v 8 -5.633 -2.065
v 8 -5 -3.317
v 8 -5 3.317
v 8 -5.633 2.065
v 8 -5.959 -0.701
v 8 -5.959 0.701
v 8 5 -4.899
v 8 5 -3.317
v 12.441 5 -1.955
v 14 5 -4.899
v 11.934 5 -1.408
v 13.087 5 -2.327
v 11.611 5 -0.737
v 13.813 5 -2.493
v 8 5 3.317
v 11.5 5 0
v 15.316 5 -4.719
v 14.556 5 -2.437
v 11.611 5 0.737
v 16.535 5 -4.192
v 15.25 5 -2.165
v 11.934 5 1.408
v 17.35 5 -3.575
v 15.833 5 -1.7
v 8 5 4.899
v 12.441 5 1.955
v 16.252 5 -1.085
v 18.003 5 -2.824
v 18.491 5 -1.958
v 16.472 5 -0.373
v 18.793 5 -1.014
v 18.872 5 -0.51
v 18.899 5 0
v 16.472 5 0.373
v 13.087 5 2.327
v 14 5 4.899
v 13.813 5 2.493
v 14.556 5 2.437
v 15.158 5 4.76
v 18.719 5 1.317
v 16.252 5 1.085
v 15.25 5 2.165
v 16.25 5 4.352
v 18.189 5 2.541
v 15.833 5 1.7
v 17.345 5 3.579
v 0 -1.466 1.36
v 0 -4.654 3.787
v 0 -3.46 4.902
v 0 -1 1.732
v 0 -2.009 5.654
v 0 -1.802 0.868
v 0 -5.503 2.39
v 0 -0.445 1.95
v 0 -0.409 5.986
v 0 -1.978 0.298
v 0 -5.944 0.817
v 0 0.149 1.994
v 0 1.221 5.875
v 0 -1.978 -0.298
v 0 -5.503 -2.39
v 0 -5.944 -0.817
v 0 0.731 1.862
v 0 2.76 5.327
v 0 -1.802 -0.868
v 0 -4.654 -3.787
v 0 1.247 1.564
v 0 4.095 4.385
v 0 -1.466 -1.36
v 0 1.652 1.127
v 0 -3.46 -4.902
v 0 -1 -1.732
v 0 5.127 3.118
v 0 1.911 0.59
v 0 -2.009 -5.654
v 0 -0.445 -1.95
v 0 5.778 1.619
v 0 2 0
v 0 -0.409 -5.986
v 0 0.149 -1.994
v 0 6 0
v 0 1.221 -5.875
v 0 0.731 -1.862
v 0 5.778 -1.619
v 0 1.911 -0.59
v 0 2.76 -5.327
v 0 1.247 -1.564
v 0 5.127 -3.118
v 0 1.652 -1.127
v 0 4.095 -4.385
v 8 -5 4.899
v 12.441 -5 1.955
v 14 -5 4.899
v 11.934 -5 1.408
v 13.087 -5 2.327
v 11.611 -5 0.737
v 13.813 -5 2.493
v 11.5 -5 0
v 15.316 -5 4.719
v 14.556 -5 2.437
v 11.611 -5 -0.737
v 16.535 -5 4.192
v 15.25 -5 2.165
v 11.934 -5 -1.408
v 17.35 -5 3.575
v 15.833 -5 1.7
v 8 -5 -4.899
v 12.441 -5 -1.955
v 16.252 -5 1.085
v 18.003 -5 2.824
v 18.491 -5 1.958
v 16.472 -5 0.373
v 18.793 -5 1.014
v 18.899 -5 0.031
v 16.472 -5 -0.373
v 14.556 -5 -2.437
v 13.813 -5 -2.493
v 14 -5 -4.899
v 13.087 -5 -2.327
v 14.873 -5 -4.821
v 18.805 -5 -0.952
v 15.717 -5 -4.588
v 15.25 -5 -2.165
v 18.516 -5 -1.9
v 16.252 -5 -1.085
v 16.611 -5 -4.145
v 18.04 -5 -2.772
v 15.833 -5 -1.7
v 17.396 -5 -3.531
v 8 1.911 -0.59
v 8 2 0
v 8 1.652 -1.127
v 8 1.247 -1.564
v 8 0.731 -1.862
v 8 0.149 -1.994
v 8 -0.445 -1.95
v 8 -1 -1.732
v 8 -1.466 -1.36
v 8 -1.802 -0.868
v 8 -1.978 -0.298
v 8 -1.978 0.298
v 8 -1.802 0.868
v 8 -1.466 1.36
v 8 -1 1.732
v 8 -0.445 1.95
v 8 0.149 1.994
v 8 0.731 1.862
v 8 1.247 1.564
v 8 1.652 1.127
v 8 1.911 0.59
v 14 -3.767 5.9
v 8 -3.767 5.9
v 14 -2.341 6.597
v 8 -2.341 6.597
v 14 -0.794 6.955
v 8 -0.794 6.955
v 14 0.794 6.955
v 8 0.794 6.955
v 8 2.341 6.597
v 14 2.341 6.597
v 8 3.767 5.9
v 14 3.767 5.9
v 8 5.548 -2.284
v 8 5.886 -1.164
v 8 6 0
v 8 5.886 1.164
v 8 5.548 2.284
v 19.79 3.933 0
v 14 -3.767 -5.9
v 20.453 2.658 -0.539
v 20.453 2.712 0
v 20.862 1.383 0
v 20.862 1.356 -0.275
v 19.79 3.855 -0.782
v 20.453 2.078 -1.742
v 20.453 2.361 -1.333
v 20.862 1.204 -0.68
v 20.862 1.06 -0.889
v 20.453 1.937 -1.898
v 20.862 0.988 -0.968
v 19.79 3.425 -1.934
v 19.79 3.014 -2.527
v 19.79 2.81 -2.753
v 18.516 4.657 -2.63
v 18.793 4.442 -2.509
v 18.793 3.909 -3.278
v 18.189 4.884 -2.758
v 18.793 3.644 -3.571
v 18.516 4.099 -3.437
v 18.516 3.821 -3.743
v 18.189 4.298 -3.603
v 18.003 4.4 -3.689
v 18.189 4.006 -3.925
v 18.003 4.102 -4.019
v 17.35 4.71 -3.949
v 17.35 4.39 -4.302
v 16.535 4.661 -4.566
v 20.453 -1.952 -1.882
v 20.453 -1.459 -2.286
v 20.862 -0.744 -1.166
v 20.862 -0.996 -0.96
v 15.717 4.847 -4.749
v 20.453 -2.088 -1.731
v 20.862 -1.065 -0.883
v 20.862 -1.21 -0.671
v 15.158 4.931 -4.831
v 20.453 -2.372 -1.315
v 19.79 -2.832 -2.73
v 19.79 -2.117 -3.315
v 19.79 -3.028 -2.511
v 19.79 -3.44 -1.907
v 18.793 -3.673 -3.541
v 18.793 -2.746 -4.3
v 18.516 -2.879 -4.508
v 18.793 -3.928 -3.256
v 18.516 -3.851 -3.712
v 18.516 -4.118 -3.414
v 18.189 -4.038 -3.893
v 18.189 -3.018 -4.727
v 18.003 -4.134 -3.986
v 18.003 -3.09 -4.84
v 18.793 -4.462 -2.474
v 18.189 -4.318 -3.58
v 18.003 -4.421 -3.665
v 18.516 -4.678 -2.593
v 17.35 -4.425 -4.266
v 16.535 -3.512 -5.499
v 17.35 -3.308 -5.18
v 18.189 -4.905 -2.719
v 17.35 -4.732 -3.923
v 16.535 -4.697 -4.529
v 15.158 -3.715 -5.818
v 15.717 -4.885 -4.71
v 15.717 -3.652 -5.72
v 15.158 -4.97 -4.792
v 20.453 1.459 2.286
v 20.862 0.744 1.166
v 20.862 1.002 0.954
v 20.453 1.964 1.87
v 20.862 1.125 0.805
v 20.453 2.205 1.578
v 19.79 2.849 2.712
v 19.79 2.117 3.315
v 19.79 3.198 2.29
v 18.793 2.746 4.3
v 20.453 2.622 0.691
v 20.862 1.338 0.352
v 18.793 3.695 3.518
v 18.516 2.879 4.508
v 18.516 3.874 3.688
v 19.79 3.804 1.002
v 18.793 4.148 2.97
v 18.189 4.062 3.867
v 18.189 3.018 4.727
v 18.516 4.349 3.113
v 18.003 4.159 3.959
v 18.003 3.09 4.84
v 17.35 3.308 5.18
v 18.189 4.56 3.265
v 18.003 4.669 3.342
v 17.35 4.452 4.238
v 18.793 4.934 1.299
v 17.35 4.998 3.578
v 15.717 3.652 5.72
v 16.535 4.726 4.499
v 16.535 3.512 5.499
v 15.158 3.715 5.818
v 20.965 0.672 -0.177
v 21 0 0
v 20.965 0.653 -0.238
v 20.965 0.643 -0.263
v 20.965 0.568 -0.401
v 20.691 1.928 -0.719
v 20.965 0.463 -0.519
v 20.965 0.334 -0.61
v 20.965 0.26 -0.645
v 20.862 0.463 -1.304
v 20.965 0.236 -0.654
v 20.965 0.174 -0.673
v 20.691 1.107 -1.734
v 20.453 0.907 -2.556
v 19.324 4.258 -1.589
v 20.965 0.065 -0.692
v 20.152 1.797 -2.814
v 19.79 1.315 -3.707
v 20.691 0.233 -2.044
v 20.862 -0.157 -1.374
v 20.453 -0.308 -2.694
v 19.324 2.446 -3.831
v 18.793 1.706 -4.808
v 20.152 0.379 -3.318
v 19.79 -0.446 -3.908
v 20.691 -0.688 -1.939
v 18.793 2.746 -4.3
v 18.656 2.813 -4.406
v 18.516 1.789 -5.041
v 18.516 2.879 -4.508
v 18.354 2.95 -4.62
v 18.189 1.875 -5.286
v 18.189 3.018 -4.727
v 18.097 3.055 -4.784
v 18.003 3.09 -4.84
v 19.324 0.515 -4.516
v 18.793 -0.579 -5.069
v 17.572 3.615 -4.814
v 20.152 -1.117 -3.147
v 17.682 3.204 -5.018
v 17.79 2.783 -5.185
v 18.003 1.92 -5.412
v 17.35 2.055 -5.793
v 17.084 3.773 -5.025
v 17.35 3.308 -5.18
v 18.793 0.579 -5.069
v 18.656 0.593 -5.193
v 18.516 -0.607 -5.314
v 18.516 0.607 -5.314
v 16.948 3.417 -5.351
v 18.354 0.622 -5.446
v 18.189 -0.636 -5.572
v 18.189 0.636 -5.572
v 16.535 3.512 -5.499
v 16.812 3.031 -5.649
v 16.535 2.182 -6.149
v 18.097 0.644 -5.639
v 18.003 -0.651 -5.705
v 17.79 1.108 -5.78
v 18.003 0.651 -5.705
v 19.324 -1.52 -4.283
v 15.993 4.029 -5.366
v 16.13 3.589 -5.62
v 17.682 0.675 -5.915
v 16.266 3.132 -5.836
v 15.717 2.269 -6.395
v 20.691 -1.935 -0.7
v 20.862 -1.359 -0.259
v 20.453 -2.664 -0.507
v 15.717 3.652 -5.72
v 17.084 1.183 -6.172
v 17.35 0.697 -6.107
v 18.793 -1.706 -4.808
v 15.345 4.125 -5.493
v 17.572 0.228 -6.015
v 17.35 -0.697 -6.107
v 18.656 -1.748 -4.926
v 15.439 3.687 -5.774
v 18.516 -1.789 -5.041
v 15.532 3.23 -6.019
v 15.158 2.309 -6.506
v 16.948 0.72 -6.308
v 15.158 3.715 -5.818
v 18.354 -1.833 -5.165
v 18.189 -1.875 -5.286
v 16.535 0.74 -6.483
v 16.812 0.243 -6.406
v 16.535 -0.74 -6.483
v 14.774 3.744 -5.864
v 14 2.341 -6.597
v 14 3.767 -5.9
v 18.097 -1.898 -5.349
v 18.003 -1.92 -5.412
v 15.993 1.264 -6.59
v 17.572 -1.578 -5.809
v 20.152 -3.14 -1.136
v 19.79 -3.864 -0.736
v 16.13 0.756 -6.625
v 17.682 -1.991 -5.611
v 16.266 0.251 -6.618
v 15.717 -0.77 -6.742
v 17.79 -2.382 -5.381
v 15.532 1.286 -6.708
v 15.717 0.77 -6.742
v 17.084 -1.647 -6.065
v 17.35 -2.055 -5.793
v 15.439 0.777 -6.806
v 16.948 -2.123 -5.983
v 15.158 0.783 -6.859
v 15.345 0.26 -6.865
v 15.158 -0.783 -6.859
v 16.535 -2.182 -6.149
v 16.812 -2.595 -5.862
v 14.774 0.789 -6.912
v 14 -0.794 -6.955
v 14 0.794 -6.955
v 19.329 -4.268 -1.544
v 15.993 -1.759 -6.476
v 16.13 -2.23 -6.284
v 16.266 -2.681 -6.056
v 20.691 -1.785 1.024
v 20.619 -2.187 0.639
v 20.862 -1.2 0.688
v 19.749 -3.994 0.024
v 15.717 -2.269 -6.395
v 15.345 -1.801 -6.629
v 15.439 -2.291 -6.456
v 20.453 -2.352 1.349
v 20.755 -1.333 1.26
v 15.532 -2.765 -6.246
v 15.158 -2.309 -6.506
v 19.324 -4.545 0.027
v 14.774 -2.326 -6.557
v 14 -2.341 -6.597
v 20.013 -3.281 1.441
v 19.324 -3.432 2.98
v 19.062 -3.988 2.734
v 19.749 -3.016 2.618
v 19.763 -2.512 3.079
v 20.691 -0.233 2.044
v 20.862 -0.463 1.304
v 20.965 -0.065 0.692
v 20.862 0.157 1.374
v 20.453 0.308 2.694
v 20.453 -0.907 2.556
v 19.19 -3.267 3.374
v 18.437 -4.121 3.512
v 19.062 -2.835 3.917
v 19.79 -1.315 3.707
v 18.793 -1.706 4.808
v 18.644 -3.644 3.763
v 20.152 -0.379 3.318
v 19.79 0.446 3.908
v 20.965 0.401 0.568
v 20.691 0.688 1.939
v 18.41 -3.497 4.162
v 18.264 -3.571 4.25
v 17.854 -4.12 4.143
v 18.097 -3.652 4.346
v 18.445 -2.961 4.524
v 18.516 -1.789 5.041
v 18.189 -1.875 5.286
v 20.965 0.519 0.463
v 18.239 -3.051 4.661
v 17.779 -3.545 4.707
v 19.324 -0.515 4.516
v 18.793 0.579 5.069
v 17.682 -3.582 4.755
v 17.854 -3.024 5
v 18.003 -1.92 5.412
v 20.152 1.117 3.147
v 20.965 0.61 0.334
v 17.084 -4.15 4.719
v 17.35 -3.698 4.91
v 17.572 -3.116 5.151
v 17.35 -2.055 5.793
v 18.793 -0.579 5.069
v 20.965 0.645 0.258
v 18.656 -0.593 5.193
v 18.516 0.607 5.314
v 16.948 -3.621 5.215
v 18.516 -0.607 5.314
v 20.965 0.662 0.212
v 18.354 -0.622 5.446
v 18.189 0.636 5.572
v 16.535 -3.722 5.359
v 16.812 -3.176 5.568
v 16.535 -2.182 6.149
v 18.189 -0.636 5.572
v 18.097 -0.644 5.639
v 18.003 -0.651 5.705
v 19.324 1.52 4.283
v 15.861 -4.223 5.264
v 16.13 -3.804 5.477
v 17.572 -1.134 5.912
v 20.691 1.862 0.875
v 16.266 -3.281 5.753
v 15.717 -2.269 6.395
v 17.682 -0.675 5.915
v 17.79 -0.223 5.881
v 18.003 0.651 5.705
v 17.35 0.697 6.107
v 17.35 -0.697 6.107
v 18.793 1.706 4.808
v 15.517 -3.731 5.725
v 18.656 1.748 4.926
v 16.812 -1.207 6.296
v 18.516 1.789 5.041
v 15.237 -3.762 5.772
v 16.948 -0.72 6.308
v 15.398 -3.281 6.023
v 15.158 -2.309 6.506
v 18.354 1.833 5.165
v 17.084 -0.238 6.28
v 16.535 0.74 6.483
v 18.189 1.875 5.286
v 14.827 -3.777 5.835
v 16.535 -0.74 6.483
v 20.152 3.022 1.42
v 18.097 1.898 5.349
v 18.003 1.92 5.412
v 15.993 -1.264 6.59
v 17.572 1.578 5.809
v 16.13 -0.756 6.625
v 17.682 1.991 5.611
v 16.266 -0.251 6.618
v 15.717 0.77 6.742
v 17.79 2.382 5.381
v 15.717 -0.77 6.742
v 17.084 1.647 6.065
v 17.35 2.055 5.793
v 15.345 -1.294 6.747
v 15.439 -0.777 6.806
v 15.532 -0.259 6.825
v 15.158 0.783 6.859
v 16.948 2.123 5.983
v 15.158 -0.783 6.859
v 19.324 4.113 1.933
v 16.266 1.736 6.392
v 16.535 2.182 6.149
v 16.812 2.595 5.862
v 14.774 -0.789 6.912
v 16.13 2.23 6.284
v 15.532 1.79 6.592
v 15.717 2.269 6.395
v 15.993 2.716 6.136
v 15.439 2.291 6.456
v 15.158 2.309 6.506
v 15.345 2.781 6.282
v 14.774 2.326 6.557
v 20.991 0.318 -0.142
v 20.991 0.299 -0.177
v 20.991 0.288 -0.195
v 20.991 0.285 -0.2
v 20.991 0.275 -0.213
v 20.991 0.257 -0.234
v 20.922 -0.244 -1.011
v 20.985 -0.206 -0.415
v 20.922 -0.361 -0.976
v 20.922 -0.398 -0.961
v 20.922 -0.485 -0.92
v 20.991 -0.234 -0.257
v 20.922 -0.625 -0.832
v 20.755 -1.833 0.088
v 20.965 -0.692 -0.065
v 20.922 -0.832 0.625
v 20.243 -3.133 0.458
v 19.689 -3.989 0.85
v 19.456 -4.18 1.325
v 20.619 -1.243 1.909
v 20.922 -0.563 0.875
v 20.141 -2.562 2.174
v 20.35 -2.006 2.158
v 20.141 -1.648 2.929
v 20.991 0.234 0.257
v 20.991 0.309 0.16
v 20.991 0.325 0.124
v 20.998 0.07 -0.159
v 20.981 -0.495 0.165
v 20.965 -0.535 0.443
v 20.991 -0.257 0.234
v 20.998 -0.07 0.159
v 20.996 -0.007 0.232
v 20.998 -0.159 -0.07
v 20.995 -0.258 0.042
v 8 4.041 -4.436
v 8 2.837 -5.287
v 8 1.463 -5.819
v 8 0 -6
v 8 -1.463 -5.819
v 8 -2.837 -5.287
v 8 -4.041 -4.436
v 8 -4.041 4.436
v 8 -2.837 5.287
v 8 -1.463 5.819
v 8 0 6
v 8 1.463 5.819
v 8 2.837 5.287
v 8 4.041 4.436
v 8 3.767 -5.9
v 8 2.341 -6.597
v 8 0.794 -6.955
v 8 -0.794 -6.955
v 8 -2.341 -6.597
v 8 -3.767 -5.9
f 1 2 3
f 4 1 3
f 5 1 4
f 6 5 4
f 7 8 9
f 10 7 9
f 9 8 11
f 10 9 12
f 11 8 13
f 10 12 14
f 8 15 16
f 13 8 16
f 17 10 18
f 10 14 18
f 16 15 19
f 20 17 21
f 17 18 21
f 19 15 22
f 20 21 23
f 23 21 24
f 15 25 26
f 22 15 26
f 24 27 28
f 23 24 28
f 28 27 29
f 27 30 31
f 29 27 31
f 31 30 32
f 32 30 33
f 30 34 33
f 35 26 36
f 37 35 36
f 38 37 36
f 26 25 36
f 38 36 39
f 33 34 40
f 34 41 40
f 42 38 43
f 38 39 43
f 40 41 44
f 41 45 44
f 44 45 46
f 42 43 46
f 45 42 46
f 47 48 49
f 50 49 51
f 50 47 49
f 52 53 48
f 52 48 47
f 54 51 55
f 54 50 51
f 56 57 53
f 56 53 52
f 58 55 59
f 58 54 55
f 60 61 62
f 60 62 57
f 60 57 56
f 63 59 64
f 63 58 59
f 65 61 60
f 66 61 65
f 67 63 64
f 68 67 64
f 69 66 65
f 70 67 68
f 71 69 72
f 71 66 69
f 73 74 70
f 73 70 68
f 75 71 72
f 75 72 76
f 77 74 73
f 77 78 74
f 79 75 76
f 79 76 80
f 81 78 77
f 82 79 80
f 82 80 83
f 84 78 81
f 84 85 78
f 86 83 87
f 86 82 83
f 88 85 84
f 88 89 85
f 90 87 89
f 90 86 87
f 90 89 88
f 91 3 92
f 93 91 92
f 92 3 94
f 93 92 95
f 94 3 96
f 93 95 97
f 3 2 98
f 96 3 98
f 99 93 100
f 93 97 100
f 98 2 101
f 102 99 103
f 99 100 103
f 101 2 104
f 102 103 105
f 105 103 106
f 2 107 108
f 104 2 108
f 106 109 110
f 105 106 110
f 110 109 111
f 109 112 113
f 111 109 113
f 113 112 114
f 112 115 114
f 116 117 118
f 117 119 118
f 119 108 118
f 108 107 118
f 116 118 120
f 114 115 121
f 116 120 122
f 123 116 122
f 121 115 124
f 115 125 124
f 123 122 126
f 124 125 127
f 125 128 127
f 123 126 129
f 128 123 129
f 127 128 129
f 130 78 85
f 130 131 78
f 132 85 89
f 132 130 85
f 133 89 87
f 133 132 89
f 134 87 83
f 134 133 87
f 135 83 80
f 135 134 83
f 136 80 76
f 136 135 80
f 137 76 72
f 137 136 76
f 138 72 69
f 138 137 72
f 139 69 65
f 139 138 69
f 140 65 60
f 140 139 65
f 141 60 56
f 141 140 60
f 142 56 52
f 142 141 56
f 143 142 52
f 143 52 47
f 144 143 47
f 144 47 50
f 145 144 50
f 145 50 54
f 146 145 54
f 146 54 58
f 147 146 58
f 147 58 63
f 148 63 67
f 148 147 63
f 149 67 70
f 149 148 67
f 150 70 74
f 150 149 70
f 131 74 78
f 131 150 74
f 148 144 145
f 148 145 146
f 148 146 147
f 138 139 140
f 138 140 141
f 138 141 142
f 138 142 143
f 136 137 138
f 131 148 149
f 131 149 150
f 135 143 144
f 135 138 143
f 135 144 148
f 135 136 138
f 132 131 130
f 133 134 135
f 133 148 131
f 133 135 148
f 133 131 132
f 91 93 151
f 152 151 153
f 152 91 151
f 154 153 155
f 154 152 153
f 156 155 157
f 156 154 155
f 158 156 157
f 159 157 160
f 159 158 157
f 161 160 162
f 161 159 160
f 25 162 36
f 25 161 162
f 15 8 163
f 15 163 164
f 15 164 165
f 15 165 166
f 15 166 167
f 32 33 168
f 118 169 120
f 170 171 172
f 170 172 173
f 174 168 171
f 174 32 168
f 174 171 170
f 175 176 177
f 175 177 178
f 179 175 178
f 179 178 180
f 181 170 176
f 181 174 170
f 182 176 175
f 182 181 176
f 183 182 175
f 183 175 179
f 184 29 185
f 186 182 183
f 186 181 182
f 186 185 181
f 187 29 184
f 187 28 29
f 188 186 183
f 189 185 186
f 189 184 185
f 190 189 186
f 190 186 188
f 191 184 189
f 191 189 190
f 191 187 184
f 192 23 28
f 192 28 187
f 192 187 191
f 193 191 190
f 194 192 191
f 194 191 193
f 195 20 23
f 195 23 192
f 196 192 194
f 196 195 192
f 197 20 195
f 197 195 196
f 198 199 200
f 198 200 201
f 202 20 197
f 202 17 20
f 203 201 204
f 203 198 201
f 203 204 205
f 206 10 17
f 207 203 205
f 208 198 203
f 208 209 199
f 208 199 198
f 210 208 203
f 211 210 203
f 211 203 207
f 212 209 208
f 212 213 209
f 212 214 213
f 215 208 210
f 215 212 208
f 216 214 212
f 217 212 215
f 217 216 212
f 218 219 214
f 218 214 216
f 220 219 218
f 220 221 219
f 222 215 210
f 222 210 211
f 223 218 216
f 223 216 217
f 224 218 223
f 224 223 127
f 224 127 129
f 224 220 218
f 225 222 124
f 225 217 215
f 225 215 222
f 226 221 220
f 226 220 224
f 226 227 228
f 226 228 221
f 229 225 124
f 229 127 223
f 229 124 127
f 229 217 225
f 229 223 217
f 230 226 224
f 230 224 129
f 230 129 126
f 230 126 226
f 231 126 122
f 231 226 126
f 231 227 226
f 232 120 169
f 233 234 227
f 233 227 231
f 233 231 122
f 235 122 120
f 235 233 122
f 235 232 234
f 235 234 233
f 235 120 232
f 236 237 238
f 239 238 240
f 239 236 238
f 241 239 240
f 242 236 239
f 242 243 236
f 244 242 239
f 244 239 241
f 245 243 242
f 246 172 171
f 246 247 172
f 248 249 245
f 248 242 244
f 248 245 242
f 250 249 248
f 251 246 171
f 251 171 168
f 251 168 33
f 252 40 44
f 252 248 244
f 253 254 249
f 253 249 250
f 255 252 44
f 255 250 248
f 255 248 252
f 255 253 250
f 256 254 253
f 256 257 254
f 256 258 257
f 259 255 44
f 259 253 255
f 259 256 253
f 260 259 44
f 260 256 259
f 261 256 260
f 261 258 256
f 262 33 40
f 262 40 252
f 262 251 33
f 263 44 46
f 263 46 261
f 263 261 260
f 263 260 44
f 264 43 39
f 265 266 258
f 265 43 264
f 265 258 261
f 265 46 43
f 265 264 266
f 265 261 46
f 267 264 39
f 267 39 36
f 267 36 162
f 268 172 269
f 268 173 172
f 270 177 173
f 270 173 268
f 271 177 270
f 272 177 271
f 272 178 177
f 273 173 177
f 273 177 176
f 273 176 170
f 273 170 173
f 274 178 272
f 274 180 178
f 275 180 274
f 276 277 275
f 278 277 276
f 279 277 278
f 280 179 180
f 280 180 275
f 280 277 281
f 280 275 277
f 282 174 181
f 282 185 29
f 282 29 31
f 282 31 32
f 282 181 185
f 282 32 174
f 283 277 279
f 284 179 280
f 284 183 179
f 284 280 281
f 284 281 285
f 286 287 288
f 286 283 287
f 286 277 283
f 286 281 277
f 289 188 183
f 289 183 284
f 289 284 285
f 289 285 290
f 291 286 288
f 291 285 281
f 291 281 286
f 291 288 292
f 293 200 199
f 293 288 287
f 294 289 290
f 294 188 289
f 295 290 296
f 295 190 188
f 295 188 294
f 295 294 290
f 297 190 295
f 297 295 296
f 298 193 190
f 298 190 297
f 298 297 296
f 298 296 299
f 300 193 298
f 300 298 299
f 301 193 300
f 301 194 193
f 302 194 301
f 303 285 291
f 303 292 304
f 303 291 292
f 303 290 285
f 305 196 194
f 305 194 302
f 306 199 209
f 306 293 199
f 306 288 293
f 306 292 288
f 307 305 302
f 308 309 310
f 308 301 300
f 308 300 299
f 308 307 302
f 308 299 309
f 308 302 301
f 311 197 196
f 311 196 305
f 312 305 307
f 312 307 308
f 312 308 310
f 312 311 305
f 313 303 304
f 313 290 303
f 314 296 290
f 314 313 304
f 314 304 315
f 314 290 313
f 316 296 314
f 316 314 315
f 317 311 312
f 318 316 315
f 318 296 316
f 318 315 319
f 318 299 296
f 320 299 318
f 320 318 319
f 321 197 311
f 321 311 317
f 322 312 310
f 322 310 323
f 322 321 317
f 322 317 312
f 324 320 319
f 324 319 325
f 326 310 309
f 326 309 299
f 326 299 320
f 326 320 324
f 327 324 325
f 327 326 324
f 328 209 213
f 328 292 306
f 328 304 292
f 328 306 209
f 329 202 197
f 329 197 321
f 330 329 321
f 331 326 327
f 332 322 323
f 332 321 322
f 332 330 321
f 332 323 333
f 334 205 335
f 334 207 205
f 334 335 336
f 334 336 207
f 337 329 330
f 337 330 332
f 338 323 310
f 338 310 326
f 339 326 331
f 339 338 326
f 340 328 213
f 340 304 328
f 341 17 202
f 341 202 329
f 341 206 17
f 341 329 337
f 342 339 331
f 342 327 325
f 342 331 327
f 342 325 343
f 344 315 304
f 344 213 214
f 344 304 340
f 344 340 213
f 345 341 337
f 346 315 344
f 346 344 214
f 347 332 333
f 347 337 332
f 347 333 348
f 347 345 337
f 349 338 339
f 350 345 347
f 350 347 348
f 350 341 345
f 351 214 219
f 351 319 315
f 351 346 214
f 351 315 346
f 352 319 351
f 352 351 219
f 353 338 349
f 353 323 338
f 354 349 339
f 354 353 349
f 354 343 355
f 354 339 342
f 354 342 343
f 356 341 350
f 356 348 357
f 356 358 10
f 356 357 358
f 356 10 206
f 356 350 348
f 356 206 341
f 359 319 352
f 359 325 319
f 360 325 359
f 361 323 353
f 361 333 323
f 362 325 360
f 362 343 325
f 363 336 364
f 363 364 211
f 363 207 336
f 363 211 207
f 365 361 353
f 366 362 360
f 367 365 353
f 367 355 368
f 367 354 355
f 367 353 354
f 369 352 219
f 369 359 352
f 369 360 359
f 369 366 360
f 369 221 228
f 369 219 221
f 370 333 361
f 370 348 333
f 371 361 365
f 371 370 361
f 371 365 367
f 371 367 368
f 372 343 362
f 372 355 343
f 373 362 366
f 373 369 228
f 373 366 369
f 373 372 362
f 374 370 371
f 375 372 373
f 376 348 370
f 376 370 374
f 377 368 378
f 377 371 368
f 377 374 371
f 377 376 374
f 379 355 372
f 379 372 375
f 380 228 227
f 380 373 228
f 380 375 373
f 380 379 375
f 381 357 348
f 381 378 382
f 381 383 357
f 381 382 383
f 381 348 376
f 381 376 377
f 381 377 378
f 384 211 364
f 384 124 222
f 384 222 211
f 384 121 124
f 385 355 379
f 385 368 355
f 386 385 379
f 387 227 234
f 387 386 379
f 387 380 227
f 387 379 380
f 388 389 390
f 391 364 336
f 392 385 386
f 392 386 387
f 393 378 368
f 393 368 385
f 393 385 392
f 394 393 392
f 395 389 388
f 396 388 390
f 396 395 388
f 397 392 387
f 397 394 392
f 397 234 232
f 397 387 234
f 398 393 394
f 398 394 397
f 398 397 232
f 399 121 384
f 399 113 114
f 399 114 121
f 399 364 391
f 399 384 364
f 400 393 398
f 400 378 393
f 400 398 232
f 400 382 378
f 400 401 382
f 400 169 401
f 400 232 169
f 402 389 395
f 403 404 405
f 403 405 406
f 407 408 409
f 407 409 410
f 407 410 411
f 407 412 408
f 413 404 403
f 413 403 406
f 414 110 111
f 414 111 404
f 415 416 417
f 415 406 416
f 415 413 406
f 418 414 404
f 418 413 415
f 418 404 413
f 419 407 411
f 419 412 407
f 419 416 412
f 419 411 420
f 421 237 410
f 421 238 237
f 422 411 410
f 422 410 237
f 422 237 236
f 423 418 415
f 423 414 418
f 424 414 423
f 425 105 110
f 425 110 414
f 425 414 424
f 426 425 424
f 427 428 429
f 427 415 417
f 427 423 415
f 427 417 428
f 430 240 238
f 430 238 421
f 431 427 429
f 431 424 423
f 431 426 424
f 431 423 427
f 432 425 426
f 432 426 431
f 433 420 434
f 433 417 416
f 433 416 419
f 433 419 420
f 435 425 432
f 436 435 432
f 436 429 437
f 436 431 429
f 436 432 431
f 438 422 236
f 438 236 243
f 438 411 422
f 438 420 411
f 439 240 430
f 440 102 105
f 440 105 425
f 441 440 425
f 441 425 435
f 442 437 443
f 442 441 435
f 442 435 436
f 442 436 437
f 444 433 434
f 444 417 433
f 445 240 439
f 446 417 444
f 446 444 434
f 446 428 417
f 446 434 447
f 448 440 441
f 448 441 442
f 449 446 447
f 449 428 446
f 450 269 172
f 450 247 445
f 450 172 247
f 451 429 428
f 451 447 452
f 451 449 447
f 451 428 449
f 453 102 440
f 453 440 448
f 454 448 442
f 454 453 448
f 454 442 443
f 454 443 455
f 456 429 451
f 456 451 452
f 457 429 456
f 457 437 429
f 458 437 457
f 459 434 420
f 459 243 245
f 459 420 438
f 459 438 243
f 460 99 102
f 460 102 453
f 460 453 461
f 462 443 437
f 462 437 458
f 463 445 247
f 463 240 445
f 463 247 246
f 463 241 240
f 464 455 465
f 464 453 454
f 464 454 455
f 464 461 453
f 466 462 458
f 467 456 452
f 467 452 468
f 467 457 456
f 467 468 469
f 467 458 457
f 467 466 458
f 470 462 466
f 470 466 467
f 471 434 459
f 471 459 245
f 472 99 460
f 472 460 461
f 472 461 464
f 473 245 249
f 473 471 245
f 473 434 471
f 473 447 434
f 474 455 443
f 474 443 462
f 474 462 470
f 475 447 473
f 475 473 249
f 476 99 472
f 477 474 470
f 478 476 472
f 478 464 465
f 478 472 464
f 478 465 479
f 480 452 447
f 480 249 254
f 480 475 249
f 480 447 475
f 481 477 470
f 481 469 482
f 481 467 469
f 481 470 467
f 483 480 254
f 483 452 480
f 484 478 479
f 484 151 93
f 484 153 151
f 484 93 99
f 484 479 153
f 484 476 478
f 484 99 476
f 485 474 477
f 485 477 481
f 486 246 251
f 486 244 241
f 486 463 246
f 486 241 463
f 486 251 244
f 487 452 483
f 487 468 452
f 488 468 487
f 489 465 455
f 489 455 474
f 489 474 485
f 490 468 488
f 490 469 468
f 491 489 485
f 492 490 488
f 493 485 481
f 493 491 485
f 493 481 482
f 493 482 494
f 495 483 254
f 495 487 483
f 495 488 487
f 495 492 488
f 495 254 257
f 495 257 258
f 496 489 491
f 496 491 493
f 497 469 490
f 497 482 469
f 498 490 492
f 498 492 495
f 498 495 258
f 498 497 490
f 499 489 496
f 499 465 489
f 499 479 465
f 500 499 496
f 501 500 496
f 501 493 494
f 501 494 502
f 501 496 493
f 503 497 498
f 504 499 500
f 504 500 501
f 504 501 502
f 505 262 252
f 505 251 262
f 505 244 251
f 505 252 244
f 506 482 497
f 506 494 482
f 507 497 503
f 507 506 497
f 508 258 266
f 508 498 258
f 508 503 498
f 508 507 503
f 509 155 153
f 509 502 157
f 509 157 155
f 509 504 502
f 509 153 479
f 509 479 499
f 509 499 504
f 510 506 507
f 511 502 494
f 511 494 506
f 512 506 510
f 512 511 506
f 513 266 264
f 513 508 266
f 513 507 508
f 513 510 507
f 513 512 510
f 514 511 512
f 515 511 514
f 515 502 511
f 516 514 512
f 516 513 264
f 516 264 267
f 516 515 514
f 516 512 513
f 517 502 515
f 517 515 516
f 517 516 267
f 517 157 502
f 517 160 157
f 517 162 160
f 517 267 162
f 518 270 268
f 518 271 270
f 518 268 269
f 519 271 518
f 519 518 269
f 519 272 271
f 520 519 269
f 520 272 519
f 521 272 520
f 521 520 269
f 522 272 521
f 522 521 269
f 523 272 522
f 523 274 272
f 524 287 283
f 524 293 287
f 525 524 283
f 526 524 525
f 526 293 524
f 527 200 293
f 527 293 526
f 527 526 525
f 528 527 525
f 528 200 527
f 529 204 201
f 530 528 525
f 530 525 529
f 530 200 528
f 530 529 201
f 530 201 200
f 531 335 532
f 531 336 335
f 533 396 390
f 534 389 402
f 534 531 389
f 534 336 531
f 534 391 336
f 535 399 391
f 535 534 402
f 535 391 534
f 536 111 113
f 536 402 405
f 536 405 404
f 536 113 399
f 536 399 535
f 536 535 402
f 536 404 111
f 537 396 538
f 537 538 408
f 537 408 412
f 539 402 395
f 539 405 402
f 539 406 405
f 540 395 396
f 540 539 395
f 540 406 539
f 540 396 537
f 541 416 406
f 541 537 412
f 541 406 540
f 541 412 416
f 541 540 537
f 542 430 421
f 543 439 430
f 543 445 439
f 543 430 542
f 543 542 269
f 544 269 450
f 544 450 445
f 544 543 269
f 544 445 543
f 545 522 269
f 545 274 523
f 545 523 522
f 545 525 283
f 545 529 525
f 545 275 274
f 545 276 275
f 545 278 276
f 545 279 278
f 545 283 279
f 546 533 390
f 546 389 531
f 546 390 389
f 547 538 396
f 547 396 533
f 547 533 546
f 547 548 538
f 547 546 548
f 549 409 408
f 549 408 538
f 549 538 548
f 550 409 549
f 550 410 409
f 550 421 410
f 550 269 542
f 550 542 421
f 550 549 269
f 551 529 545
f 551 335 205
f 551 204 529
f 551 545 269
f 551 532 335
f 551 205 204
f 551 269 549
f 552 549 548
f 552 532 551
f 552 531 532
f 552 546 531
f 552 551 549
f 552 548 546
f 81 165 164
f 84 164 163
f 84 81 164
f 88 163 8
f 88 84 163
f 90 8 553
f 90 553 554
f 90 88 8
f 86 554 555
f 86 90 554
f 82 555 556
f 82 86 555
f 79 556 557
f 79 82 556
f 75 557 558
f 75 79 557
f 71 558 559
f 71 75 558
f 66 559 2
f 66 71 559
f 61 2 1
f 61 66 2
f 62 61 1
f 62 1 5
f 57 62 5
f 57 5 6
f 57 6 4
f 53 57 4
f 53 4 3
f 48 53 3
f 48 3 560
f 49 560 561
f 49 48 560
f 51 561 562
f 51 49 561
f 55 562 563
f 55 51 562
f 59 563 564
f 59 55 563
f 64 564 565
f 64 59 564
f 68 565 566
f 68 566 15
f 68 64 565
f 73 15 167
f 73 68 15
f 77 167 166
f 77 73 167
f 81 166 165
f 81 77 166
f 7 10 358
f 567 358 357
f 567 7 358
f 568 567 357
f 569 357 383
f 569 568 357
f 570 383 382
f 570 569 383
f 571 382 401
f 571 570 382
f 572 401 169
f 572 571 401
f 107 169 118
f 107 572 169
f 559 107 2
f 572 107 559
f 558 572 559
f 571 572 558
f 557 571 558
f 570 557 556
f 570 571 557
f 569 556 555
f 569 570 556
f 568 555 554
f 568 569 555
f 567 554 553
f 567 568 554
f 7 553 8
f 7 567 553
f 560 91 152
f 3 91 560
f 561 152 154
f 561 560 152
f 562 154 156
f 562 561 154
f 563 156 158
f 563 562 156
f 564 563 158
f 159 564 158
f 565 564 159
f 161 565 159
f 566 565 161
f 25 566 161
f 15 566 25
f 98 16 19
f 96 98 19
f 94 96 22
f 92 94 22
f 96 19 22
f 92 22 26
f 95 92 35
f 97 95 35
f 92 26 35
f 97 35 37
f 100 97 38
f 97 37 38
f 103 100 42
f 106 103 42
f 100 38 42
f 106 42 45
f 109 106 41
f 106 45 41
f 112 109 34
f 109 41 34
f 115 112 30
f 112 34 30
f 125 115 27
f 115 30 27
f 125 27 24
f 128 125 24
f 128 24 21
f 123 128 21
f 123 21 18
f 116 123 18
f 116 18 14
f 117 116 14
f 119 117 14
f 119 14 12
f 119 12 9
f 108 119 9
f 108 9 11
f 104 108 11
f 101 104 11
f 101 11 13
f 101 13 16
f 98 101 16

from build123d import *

# Parameters (mm, degrees)
F2_W     = 20
F2_H     = 8.8103966404
F3_DEPTH = 12.5
F4_R     = 2.5
F5_DEPTH = 25


# Not quite as in the source:
# - ends of sketch curves that miss each other by under 0.0002 mm in the source are joined


with BuildPart() as f1:
    # F0 (on Top) → F1 (revolve)
    with BuildSketch(Plane.XY):
        with BuildLine():
            Line((0, 6), (0, 2))
            Line((0, 2), (8, 2))
            Line((8, 2), (8, 0))
            Line((8, 0), (21, 0))
            ThreePointArc((21, 0), (18.9497474683, 4.9497475801), (14, 7.0000001118))
            Line((14, 7.0000001118), (8, 7.0000001118))
            Line((8, 7.0000001118), (8, 6))
            Line((8, 6), (0, 6))
        make_face()
    revolve(axis=Axis((-4.767620936, 0, 0), (-1, 0, 0)))

    # F2 (on Top) → F3 (cut, symmetric)
    with BuildSketch(Plane.XY):
        with Locations((18, -9.4051983202)):
            Rectangle(F2_W, F2_H)
        with Locations((18, 9.4051983202)):
            Rectangle(F2_W, F2_H)
    extrude(amount=F3_DEPTH, both=True, mode=Mode.SUBTRACT)

    # F4 (on face) → F5 (cut)
    with BuildSketch(Plane(origin=(0, 5, 0), x_dir=(-1, 0, 0), z_dir=(0, 1, 0))):
        with Locations((-14, 0)):
            Circle(F4_R)
    extrude(amount=-F5_DEPTH, mode=Mode.SUBTRACT)


solid = f1.part
